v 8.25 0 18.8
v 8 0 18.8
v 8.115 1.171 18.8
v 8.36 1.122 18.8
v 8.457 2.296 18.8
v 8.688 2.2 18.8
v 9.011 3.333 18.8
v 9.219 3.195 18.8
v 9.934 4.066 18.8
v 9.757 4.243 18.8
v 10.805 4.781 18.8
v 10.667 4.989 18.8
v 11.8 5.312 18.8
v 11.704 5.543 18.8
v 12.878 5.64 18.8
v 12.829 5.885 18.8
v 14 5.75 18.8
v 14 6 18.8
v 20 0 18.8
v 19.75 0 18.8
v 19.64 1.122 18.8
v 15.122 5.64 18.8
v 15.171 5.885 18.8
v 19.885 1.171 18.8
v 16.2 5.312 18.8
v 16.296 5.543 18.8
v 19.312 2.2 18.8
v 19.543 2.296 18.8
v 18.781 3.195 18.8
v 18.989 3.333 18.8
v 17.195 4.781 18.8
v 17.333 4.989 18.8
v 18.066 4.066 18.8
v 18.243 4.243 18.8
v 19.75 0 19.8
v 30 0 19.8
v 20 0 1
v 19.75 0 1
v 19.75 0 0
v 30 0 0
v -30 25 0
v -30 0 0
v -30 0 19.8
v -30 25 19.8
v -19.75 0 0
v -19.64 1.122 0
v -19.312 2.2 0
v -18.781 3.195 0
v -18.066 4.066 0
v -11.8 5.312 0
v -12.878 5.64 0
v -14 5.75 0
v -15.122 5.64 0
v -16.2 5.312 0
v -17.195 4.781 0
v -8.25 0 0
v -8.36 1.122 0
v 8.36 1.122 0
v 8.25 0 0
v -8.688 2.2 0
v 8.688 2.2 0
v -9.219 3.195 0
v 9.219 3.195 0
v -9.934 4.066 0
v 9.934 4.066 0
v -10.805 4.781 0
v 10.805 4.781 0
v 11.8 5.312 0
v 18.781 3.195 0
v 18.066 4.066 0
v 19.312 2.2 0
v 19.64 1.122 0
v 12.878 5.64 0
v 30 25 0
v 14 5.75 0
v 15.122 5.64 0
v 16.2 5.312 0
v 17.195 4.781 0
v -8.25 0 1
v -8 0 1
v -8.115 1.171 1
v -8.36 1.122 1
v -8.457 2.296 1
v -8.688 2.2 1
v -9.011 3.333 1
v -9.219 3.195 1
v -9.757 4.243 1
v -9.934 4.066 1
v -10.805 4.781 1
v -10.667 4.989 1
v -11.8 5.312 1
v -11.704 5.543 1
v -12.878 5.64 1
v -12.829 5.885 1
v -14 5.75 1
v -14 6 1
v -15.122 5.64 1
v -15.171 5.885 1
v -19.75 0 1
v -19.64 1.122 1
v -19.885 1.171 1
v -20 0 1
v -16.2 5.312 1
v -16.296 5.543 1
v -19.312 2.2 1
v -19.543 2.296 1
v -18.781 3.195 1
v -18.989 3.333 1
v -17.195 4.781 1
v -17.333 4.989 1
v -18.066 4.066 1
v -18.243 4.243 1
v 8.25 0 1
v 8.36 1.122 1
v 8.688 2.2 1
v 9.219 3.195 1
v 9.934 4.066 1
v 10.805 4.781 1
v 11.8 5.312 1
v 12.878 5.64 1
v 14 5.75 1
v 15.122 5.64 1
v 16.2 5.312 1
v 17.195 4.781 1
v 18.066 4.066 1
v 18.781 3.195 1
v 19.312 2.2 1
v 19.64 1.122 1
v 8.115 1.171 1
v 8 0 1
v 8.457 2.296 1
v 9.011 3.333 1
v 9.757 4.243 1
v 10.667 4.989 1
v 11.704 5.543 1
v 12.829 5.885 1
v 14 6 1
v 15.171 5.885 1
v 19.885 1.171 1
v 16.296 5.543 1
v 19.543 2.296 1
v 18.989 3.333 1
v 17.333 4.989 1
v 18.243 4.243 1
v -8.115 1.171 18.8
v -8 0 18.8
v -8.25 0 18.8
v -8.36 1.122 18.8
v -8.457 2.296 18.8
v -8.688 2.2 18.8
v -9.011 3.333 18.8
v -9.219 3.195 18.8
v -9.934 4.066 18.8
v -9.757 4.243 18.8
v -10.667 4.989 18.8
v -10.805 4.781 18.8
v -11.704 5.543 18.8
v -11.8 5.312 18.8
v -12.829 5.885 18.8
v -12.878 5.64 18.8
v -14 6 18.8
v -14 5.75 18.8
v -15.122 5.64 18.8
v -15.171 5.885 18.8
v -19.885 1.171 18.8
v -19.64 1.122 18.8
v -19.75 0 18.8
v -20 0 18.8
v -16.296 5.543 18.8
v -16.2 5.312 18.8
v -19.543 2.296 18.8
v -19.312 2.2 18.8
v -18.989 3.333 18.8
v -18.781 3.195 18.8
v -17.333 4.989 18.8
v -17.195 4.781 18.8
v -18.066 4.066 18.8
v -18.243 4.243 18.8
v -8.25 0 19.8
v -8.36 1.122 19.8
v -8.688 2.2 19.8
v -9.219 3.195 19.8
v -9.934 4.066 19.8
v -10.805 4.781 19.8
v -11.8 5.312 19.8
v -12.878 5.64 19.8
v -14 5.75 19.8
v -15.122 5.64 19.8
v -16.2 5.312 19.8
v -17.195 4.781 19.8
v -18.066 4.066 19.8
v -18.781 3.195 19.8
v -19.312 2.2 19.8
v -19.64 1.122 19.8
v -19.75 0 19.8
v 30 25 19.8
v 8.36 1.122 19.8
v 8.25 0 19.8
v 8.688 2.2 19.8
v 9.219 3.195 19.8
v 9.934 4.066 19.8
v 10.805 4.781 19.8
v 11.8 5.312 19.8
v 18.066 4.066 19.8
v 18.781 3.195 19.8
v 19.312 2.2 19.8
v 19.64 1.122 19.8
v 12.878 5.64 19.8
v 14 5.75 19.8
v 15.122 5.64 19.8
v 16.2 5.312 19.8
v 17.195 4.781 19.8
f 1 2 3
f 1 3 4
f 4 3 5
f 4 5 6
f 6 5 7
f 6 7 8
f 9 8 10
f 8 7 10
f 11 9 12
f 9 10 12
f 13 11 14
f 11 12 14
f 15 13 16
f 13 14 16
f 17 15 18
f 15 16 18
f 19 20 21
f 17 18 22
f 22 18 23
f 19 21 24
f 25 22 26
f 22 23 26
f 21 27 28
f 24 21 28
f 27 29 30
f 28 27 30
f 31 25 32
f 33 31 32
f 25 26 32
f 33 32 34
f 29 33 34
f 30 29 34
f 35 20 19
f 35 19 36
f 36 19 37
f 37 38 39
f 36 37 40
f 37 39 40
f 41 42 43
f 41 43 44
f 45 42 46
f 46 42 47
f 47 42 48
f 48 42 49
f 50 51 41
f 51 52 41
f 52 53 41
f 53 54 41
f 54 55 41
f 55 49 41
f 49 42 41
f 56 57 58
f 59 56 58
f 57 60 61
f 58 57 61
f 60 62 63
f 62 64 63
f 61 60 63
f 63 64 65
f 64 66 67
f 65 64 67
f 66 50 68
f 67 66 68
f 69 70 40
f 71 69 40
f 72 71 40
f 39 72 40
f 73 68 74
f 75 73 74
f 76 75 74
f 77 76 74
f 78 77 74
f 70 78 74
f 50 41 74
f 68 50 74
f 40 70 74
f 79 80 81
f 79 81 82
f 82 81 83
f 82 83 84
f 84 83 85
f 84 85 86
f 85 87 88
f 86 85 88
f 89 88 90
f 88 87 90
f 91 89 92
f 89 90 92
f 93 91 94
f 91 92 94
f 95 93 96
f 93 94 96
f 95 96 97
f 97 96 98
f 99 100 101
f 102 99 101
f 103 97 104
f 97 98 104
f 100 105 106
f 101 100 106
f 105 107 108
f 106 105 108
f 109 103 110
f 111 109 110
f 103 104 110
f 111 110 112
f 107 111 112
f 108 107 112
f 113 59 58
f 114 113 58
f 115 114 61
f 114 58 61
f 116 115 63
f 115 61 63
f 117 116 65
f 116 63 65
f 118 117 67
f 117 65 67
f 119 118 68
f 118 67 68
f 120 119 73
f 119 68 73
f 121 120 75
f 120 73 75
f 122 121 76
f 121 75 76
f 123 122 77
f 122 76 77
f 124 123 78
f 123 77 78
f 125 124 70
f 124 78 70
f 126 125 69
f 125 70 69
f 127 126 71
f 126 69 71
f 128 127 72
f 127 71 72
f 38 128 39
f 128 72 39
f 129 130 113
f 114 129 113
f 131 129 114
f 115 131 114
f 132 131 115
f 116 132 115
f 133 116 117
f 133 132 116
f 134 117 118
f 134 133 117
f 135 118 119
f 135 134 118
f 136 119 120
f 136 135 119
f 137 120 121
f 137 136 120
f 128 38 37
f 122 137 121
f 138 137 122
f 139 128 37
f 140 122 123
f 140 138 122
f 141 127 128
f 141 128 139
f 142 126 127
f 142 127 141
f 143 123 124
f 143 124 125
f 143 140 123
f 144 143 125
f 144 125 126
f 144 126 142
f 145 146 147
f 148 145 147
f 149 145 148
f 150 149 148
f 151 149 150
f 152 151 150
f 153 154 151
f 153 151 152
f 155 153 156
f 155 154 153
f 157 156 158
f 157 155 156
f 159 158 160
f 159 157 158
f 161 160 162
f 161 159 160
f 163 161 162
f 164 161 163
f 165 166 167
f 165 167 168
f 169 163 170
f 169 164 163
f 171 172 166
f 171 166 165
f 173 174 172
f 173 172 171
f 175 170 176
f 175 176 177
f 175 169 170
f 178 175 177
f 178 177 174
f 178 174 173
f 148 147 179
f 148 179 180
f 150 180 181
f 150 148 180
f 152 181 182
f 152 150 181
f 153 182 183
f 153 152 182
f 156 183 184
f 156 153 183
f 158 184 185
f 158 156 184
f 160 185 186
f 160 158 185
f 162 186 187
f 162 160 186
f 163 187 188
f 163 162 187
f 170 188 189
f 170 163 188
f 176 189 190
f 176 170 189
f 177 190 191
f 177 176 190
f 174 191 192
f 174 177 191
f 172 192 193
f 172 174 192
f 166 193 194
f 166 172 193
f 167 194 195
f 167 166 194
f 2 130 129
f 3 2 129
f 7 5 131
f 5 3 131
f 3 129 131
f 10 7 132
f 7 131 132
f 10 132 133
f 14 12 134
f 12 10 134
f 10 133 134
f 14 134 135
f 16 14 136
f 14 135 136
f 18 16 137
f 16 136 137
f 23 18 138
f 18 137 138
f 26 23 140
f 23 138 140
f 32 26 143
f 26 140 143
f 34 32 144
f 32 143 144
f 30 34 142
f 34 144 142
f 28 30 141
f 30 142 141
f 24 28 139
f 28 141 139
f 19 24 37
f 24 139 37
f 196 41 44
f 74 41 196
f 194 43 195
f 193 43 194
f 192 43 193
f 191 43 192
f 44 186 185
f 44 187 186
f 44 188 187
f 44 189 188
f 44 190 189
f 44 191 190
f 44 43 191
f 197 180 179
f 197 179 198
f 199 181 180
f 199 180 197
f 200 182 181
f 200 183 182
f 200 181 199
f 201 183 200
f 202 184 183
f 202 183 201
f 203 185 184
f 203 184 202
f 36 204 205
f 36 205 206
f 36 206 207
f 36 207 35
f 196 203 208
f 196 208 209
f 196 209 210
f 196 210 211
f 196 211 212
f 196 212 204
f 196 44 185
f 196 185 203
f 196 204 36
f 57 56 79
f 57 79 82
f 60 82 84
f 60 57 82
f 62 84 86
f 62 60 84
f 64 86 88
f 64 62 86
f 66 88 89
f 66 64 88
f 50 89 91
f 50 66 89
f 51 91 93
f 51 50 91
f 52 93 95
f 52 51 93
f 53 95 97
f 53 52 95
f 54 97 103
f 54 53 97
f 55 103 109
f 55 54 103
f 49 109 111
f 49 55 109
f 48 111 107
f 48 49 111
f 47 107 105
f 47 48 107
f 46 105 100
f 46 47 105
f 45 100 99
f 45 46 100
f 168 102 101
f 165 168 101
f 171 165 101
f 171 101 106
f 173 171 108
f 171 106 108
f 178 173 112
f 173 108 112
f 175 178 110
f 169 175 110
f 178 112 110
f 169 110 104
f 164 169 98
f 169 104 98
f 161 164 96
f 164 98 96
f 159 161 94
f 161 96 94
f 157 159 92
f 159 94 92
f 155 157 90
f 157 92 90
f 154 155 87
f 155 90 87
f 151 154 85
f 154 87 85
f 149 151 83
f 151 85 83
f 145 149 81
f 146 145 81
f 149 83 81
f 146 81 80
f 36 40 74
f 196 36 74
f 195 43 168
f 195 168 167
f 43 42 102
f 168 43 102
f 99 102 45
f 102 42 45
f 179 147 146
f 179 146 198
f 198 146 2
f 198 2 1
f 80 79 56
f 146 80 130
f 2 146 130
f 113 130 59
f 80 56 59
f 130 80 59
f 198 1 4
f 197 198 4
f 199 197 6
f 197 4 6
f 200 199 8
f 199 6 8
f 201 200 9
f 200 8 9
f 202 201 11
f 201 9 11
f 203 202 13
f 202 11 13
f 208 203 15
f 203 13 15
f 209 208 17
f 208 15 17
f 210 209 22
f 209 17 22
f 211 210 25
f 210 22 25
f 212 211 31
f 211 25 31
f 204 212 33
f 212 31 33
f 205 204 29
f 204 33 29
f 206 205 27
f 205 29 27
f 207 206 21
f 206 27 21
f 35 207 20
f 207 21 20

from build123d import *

# Parameters (mm, degrees)
SKETCH1_W           = 60
SKETCH1_H           = 25
BOSS_EXTRUDE1_DEPTH = 19.8
CUT_EXTRUDE3_DEPTH  = 19.8
BOSS_EXTRUDE2_DEPTH = 1
BOSS_EXTRUDE3_START = -18.8
BOSS_EXTRUDE3_DEPTH = 1


with BuildPart() as part:
    # Sketch1 → Boss-Extrude1 (new body)
    with BuildSketch(Plane.XY):
        with Locations((0, 12.5)):
            Rectangle(SKETCH1_W, SKETCH1_H)
    extrude(amount=BOSS_EXTRUDE1_DEPTH)

    # Sketch2 → Cut-Extrude3 (cut)
    with BuildSketch(Plane(origin=(0, 0, 0), x_dir=(-1, 0, 0), z_dir=(0, 0, -1))):
        with BuildLine():
            Line((-20, 0), (-8, 0))
            ThreePointArc((-8, 0), (-14, 6), (-20, 0))
        make_face()
        with BuildLine():
            Line((8, 0), (20, 0))
            ThreePointArc((20, 0), (14, 6), (8, 0))
        make_face()
    extrude(amount=-CUT_EXTRUDE3_DEPTH, mode=Mode.SUBTRACT)

    # Sketch4 → Boss-Extrude2 (add)
    with BuildSketch(Plane(origin=(0, 0, 0), x_dir=(-1, 0, 0), z_dir=(0, 0, -1))):
        with BuildLine():
            Line((-19.75, 0), (-20, 0))
            ThreePointArc((-20, 0), (-14, 6), (-8, 0))
            Line((-8, 0), (-8.25, 0))
            ThreePointArc((-8.25, 0), (-14, 5.75), (-19.75, 0))
        make_face()
        with BuildLine():
            Line((8, 0), (8.25, 0))
            ThreePointArc((8.25, 0), (14, 5.75), (19.75, 0))
            Line((19.75, 0), (20, 0))
            ThreePointArc((20, 0), (14, 6), (8, 0))
        make_face()
    extrude(amount=-BOSS_EXTRUDE2_DEPTH)

    # Sketch4<2> → Boss-Extrude3 (add)
    with BuildSketch(Plane(origin=(0, 0, 0), x_dir=(-1, 0, 0), z_dir=(0, 0, -1)).offset(BOSS_EXTRUDE3_START)):
        with BuildLine():
            Line((-19.75, 0), (-20, 0))
            ThreePointArc((-20, 0), (-14, 6), (-8, 0))
            Line((-8, 0), (-8.25, 0))
            ThreePointArc((-8.25, 0), (-14, 5.75), (-19.75, 0))
        make_face()
        with BuildLine():
            Line((8, 0), (8.25, 0))
            ThreePointArc((8.25, 0), (14, 5.75), (19.75, 0))
            Line((19.75, 0), (20, 0))
            ThreePointArc((20, 0), (14, 6), (8, 0))
        make_face()
    extrude(amount=-BOSS_EXTRUDE3_DEPTH)


solid = part.part
